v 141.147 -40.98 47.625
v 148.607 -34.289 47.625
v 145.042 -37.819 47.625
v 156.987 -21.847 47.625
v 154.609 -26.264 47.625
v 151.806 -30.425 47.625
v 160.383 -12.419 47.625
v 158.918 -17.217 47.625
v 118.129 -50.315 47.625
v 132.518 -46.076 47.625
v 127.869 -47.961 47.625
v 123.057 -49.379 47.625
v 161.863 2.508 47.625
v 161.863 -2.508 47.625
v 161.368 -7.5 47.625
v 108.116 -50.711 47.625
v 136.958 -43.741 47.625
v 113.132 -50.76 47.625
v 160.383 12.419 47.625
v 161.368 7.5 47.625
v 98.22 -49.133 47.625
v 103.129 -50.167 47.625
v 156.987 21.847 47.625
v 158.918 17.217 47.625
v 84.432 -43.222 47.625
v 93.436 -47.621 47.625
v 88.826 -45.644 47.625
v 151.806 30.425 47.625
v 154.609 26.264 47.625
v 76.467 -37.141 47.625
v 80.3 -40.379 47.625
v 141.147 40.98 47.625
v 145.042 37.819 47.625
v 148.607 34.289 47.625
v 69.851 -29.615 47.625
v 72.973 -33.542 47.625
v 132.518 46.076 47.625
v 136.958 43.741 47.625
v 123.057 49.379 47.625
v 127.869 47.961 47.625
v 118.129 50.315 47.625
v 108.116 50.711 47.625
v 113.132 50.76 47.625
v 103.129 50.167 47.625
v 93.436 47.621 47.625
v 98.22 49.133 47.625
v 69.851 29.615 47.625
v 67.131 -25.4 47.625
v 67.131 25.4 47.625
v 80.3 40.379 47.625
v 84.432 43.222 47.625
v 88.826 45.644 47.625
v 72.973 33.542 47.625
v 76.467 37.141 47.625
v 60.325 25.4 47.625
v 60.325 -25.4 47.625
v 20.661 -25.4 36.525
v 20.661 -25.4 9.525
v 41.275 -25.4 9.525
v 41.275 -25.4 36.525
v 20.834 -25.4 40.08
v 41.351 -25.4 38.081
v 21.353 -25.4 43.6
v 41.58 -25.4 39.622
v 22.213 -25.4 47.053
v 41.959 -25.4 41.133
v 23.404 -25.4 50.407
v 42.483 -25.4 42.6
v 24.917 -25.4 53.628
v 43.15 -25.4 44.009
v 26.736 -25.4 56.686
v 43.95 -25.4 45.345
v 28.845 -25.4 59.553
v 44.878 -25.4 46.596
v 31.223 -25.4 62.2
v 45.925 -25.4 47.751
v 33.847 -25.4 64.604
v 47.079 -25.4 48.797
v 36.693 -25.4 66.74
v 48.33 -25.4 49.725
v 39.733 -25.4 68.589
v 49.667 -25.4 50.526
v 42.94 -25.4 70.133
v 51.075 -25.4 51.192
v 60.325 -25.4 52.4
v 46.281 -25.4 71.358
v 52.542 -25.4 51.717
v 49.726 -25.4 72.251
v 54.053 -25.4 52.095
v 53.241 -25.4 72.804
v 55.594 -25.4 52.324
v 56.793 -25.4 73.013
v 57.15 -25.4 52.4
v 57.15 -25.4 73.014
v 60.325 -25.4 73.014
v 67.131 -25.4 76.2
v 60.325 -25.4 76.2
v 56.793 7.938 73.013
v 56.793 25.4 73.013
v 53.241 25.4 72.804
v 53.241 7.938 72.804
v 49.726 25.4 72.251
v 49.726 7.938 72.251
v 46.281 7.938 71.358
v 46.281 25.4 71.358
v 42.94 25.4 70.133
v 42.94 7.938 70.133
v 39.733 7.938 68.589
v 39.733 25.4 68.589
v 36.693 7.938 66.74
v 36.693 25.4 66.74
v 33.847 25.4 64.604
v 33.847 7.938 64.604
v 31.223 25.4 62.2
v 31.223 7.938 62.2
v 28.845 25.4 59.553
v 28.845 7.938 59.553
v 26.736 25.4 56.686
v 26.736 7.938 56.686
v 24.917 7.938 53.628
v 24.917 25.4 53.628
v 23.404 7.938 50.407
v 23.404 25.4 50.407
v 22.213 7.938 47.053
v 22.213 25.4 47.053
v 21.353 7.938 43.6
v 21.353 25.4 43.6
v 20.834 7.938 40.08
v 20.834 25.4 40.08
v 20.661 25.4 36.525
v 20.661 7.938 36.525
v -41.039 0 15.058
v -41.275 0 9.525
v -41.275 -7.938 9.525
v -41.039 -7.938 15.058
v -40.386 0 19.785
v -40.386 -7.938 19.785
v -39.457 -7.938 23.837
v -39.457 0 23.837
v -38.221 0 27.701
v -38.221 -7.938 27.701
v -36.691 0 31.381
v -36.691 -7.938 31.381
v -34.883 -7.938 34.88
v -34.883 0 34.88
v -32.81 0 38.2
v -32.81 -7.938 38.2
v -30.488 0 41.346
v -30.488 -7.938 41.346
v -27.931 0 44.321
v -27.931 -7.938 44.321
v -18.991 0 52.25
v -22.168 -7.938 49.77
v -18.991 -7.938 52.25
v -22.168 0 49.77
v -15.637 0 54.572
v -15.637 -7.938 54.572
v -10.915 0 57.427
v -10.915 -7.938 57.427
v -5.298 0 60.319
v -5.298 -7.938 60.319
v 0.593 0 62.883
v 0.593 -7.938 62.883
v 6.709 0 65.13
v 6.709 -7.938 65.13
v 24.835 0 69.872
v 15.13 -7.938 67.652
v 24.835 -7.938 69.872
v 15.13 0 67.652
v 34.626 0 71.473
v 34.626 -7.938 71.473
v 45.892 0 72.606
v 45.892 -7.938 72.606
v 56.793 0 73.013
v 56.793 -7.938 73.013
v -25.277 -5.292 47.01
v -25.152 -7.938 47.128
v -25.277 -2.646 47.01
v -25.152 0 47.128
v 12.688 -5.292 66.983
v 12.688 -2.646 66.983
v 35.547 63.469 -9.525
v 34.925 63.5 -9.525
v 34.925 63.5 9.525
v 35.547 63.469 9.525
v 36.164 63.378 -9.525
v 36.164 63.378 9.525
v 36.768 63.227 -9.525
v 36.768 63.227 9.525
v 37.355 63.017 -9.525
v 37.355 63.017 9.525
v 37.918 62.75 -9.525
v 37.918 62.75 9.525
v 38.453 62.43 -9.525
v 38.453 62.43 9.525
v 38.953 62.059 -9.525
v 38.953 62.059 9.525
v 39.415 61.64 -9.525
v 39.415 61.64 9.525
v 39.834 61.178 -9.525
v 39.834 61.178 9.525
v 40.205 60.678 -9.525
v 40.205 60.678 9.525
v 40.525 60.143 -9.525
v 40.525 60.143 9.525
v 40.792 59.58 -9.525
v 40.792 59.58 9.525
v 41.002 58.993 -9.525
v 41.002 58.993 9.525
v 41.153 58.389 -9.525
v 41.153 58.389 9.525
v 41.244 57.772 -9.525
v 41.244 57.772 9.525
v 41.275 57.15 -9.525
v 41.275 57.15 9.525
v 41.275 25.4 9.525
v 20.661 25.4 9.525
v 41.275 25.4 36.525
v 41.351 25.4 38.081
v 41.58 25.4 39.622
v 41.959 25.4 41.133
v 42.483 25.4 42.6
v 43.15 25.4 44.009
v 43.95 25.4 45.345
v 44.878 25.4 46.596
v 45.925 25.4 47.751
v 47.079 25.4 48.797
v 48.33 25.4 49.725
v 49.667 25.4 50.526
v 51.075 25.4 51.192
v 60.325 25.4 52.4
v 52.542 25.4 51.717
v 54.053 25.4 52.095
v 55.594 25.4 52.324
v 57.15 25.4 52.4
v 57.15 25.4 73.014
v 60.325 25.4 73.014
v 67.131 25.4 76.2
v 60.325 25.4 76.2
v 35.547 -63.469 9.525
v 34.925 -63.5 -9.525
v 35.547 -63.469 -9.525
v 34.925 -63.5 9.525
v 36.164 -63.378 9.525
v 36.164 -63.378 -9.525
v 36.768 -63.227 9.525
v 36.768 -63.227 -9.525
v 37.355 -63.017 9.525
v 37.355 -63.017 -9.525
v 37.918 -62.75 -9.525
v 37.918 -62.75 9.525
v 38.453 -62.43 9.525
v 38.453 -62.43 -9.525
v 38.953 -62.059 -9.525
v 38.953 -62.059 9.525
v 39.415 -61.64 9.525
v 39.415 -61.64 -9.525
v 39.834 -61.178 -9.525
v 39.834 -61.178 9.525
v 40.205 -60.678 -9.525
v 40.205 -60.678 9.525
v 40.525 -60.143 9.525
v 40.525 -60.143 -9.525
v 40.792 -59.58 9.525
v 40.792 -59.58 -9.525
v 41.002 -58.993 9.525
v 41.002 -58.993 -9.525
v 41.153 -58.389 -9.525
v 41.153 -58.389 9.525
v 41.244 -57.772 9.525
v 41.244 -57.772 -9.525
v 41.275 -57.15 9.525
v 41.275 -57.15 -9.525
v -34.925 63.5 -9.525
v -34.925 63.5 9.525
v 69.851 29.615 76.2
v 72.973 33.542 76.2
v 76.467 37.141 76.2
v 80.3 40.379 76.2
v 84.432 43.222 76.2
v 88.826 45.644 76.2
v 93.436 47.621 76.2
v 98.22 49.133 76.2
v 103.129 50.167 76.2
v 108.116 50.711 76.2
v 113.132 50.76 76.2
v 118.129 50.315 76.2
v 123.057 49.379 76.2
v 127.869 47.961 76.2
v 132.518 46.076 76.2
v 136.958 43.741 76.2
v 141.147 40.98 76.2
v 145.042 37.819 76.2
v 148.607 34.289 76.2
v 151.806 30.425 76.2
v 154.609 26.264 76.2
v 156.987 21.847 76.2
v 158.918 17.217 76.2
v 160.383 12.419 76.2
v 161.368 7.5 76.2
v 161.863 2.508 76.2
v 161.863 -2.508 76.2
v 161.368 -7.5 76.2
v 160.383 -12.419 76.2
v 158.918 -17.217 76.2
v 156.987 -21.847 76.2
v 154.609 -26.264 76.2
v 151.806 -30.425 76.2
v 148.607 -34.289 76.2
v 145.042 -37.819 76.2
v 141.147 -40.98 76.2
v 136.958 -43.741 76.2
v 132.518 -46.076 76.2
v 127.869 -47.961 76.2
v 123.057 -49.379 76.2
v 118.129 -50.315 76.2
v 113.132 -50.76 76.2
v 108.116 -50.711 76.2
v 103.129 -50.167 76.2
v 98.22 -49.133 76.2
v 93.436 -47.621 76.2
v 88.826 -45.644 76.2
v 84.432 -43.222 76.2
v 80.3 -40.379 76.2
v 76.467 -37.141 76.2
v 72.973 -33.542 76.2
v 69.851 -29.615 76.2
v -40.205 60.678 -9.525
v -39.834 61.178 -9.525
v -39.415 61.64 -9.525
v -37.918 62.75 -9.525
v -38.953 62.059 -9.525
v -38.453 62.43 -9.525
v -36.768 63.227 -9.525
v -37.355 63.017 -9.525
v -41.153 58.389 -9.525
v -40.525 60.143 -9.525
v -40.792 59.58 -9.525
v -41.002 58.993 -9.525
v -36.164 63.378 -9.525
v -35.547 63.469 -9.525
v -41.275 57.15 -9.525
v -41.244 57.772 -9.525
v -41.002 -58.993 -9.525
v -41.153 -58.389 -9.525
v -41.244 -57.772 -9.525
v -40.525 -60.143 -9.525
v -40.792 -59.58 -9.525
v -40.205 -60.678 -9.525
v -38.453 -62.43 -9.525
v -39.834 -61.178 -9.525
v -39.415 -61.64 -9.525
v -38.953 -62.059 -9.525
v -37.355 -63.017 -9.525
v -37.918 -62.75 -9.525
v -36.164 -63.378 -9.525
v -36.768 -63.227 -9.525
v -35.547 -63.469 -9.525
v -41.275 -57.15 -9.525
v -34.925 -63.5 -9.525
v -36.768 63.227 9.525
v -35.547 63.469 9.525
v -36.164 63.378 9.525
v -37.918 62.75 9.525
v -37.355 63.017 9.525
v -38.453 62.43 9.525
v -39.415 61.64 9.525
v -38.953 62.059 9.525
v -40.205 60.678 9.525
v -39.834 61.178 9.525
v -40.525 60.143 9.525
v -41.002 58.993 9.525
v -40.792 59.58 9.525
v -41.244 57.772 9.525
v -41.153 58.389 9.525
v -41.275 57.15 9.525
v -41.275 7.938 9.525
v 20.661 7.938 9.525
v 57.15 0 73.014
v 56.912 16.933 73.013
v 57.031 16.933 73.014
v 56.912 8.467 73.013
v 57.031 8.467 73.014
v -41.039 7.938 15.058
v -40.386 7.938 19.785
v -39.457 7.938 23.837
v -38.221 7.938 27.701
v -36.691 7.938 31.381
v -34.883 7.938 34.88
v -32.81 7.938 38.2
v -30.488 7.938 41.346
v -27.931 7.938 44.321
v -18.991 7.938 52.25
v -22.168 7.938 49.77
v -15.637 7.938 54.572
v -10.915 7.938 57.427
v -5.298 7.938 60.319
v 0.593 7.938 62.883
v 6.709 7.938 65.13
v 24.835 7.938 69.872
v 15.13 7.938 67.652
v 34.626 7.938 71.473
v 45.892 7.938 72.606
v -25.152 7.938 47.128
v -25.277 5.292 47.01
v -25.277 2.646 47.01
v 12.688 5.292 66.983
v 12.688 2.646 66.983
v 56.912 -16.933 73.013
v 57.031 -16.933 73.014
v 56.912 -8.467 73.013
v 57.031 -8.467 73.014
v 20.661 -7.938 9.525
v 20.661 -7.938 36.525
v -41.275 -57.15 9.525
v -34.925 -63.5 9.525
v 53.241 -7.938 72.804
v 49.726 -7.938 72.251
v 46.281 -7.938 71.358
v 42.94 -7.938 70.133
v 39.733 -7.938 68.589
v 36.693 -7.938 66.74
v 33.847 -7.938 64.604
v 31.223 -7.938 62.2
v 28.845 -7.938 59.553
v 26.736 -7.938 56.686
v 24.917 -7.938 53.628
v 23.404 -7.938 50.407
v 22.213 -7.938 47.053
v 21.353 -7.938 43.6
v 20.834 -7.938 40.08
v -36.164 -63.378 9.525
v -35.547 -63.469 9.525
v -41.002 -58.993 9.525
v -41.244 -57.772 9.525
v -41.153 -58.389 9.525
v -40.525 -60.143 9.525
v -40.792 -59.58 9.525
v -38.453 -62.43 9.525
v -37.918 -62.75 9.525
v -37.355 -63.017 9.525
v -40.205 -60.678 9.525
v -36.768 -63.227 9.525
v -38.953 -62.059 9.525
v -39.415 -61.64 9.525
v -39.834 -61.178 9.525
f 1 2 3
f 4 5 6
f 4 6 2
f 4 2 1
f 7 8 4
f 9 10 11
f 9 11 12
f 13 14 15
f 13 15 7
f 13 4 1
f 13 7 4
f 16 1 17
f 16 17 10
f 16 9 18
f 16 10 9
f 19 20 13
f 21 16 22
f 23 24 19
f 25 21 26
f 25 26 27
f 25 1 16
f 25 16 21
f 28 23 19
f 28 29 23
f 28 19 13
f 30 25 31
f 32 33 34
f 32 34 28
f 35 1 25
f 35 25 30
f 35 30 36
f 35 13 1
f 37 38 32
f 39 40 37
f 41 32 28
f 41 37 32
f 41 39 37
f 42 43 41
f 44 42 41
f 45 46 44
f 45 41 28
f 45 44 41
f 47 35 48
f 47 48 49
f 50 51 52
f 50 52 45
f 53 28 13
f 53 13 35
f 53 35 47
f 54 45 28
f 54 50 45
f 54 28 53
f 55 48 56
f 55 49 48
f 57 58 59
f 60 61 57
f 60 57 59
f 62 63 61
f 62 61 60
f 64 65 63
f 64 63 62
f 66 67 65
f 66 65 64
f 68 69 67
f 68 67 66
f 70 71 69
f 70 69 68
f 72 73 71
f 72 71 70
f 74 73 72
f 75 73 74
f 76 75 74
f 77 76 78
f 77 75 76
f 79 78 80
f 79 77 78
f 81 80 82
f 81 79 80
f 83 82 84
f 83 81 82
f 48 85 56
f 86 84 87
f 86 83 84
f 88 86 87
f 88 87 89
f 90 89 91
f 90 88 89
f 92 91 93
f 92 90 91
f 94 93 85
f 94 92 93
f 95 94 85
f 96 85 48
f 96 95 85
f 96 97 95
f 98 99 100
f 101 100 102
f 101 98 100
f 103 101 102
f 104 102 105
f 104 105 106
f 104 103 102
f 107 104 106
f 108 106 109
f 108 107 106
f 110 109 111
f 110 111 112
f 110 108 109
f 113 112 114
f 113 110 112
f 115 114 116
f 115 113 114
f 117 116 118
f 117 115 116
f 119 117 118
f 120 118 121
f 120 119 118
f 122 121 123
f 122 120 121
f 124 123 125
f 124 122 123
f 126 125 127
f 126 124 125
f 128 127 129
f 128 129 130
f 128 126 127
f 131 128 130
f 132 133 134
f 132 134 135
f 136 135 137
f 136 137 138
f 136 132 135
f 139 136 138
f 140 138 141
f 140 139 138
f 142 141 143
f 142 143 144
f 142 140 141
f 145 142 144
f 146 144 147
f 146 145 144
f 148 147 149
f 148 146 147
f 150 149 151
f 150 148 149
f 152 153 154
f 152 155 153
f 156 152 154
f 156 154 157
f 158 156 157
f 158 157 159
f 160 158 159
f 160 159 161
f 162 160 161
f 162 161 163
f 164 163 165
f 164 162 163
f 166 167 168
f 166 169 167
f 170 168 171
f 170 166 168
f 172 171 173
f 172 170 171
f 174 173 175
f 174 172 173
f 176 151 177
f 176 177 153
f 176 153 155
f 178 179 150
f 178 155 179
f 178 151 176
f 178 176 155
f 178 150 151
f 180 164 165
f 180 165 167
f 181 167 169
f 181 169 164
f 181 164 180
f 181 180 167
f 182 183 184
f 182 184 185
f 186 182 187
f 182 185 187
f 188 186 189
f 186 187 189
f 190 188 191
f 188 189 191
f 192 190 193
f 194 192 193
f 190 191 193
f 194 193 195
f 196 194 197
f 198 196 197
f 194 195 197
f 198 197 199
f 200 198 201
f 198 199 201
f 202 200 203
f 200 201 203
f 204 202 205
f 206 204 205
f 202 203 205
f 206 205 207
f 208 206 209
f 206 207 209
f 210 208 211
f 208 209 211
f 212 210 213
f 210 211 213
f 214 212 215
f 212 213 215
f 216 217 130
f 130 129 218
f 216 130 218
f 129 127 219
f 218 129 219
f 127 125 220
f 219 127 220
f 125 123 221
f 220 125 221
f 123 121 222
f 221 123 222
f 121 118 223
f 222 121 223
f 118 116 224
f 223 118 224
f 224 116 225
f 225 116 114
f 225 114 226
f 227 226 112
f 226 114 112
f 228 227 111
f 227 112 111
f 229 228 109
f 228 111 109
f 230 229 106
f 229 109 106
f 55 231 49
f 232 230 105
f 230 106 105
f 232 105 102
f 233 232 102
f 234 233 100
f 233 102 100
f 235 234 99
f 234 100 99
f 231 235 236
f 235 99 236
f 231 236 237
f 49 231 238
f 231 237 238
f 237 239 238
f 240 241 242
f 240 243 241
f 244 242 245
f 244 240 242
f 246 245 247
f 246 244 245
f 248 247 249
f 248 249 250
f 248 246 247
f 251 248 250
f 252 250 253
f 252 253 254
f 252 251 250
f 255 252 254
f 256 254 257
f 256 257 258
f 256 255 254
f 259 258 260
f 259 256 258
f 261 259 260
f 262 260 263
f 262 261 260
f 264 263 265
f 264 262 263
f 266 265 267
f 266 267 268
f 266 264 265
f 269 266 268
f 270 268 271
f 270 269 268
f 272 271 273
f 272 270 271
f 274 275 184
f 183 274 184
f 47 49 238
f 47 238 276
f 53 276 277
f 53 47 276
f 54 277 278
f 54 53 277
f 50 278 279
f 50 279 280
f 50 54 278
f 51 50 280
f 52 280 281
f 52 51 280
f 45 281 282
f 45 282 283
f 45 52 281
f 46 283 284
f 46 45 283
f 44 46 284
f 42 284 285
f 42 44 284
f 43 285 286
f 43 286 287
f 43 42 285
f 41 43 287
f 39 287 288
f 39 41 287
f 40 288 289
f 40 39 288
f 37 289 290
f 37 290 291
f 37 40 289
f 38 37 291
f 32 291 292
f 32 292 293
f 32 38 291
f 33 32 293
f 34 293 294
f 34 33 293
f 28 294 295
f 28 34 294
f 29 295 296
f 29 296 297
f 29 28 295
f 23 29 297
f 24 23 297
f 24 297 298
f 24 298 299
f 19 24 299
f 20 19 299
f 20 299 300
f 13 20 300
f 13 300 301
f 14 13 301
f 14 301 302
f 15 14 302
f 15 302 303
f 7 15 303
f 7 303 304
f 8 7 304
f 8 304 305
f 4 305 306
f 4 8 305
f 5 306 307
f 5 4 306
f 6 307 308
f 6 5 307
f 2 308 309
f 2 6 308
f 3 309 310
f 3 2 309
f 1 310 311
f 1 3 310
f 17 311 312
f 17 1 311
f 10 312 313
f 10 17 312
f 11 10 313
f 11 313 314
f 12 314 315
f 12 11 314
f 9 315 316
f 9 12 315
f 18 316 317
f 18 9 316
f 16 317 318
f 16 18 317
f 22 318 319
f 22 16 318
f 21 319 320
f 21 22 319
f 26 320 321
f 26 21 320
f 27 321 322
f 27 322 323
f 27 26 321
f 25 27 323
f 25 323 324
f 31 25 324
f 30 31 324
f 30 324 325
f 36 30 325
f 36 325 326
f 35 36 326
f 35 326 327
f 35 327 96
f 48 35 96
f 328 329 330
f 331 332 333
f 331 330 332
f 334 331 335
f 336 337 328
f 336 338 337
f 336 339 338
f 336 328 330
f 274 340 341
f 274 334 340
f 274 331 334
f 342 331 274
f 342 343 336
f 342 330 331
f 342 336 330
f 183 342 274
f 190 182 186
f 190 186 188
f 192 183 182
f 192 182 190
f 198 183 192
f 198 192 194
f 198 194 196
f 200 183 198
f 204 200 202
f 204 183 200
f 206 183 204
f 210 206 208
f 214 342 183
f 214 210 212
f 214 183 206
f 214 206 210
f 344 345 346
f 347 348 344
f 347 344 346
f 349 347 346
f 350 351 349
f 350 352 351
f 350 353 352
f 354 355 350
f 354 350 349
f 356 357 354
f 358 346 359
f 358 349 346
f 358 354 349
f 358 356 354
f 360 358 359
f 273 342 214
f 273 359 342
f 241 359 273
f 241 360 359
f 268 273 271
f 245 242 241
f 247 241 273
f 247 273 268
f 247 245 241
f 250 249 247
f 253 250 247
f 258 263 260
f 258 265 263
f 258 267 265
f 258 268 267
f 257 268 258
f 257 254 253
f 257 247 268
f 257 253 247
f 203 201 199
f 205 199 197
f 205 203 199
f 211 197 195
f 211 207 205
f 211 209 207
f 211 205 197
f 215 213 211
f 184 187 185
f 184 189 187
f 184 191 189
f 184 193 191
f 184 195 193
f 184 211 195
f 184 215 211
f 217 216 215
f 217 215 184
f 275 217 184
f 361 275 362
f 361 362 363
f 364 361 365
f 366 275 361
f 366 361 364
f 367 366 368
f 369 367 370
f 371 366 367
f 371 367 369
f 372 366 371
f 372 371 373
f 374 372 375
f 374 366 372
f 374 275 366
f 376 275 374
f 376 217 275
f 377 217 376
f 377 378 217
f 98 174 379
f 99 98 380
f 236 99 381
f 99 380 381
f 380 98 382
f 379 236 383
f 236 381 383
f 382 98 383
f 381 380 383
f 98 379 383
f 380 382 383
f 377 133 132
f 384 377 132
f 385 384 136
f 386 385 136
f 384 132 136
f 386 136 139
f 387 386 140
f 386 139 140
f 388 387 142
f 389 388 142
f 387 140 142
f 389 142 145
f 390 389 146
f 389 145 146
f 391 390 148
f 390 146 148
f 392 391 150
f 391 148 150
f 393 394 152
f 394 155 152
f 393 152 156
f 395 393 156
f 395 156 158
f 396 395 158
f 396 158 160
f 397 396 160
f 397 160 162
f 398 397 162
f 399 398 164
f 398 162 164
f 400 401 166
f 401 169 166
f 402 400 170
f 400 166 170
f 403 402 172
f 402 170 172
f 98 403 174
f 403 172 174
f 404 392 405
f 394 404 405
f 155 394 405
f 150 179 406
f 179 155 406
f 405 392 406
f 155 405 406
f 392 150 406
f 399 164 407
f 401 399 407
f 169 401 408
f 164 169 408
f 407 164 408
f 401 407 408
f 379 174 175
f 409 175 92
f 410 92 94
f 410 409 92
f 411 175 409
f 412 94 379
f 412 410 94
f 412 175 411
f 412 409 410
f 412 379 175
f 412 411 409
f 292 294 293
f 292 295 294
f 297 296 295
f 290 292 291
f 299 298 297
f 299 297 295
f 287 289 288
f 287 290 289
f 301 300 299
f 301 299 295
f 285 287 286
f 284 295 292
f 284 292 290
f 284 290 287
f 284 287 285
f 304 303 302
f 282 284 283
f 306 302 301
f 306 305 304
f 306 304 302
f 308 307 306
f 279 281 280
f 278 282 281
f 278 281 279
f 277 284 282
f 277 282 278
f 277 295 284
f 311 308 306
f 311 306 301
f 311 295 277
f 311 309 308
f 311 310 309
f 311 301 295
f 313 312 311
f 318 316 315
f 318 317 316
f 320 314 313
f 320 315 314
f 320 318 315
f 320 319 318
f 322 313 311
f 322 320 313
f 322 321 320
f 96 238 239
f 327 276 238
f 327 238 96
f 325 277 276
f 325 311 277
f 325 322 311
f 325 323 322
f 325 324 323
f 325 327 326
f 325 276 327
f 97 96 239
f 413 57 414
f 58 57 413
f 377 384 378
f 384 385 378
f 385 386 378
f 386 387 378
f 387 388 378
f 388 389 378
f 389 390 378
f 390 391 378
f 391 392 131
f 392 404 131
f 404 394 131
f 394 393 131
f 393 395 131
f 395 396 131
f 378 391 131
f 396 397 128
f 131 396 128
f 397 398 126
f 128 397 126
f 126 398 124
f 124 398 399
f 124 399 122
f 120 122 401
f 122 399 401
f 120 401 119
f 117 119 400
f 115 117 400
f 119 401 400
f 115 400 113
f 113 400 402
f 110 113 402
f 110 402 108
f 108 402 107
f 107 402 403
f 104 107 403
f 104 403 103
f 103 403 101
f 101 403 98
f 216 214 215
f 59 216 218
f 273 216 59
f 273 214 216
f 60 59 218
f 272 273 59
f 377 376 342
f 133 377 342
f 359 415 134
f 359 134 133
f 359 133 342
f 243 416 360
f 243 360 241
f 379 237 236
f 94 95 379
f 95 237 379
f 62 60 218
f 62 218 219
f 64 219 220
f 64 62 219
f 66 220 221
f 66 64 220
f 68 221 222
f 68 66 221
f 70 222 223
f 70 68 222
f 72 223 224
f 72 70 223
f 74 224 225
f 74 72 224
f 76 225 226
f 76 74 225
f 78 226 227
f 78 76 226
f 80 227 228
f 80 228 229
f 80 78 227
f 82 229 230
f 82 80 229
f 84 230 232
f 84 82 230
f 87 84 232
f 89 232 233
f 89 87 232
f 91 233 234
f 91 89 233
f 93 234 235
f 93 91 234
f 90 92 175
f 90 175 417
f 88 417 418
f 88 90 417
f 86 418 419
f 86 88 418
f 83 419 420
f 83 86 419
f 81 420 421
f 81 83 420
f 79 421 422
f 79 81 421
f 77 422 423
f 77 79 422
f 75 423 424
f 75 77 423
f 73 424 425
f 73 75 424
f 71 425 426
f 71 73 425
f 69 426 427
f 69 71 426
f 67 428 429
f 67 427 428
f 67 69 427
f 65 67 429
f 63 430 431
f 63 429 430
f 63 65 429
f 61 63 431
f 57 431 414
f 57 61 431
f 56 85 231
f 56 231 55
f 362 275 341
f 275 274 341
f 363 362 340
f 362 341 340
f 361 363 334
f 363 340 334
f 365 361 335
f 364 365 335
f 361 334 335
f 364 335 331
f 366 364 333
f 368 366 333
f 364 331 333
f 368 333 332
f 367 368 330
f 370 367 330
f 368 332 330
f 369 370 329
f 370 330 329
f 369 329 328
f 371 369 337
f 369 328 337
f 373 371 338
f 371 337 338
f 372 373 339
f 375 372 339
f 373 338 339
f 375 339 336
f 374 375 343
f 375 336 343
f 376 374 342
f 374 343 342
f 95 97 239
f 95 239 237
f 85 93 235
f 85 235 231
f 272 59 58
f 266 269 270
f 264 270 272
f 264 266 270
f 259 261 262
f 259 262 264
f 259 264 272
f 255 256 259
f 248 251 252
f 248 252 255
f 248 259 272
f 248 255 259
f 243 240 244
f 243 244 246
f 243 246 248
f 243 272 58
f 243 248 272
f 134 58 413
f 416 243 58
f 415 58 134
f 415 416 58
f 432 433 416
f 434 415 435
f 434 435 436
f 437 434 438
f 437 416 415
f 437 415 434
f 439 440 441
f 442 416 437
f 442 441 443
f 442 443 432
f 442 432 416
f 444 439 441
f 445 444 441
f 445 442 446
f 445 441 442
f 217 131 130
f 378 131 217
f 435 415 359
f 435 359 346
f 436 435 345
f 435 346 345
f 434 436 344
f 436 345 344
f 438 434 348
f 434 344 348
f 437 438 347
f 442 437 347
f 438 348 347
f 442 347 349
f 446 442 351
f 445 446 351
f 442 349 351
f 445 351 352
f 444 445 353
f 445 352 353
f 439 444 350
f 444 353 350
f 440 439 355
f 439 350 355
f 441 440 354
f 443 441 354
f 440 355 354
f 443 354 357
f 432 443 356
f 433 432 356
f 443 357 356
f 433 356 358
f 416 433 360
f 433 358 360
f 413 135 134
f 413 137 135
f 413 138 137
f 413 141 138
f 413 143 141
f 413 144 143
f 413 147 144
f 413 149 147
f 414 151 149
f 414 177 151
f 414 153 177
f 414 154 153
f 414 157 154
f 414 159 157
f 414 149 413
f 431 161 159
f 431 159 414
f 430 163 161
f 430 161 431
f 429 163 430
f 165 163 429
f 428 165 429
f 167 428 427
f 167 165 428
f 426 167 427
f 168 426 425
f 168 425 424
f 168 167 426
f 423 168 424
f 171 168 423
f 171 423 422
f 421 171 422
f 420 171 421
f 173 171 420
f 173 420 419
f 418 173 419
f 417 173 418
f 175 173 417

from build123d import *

# Parameters (mm, degrees)
F1_DEPTH = 63.5
F2_DEPTH = 25.4
F3_DEPTH = 7.9375
F5_R     = 6.35


with BuildPart() as f1:
    # F0 (on Front) → F1 (new body, symmetric)
    with BuildSketch(Plane.XZ):
        Polygon((41.275, -9.525), (41.275, 9.525), (20.660926, 9.525), (-41.275, 9.525), (-41.275, -9.525), align=None)
    extrude(amount=F1_DEPTH, both=True)

    # F0 (on Front) → F2 (join, symmetric)
    with BuildSketch(Plane.XZ):
        with BuildLine():
            Line((20.660926, 9.525), (41.275, 9.525))
            Line((41.275, 9.525), (41.275, 36.5252))
            ThreePointArc((41.275, 36.5252), (45.92468, 47.75052), (57.15, 52.4002))
            Line((57.15, 52.4002), (60.325, 52.4002))
            Line((60.325, 52.4002), (60.325, 73.014274))
            Line((60.325, 73.014274), (57.15, 73.014274))
            add(Edge.make_bspline(
                [(56.793396, 73.012532), (56.912382, 73.013238), (57.03125, 73.013819), (57.15, 73.014274)],
                knots=[116.793783, 116.793783, 116.793783, 116.793783, 117.12544, 117.12544, 117.12544, 117.12544], degree=3))
            ThreePointArc((56.793396, 73.012532), (31.222556, 62.200484), (20.660926, 36.5252))
            Line((20.660926, 36.5252), (20.660926, 9.525))
        make_face()
        Polygon((60.325, 73.014274), (60.325, 52.4002), (60.325, 47.625), (111.125, 47.625), (111.125, 76.2), (60.325, 76.2), align=None)
    extrude(amount=F2_DEPTH, both=True)

    # F0 (on Front) → F3 (join, symmetric)
    with BuildSketch(Plane.XZ):
        with BuildLine():
            Line((-41.275, 9.525), (20.660926, 9.525))
            Line((20.660926, 9.525), (20.660926, 36.5252))
            ThreePointArc((20.660926, 36.5252), (31.222556, 62.200484), (56.793396, 73.012532))
            add(Edge.make_bspline(
                [(-41.275, 9.525), (-41.534558, 56.956479), (14.892301, 72.763843), (56.793396, 73.012532)],
                knots=[0, 0, 0, 0, 116.793783, 116.793783, 116.793783, 116.793783], degree=3))
        make_face()
    extrude(amount=F3_DEPTH, both=True)

    # F0 (on Front) → F4 (revolve)
    with BuildSketch(Plane.XZ):
        Polygon((60.325, 73.014274), (60.325, 52.4002), (60.325, 47.625), (111.125, 47.625), (111.125, 76.2), (60.325, 76.2), align=None)
    revolve(axis=Axis((111.125, 0, 61.9125), (0, 0, -1)))

    # F5
    f5_edges = [f1.edges().sort_by_distance(p)[0] for p in [
        (41.275, -63.5, 0),
        (-41.275, -63.5, 0),
        (41.275, 63.5, 0),
        (-41.275, 63.5, 0),
    ]]
    fillet(f5_edges, radius=F5_R)


solid = f1.part
